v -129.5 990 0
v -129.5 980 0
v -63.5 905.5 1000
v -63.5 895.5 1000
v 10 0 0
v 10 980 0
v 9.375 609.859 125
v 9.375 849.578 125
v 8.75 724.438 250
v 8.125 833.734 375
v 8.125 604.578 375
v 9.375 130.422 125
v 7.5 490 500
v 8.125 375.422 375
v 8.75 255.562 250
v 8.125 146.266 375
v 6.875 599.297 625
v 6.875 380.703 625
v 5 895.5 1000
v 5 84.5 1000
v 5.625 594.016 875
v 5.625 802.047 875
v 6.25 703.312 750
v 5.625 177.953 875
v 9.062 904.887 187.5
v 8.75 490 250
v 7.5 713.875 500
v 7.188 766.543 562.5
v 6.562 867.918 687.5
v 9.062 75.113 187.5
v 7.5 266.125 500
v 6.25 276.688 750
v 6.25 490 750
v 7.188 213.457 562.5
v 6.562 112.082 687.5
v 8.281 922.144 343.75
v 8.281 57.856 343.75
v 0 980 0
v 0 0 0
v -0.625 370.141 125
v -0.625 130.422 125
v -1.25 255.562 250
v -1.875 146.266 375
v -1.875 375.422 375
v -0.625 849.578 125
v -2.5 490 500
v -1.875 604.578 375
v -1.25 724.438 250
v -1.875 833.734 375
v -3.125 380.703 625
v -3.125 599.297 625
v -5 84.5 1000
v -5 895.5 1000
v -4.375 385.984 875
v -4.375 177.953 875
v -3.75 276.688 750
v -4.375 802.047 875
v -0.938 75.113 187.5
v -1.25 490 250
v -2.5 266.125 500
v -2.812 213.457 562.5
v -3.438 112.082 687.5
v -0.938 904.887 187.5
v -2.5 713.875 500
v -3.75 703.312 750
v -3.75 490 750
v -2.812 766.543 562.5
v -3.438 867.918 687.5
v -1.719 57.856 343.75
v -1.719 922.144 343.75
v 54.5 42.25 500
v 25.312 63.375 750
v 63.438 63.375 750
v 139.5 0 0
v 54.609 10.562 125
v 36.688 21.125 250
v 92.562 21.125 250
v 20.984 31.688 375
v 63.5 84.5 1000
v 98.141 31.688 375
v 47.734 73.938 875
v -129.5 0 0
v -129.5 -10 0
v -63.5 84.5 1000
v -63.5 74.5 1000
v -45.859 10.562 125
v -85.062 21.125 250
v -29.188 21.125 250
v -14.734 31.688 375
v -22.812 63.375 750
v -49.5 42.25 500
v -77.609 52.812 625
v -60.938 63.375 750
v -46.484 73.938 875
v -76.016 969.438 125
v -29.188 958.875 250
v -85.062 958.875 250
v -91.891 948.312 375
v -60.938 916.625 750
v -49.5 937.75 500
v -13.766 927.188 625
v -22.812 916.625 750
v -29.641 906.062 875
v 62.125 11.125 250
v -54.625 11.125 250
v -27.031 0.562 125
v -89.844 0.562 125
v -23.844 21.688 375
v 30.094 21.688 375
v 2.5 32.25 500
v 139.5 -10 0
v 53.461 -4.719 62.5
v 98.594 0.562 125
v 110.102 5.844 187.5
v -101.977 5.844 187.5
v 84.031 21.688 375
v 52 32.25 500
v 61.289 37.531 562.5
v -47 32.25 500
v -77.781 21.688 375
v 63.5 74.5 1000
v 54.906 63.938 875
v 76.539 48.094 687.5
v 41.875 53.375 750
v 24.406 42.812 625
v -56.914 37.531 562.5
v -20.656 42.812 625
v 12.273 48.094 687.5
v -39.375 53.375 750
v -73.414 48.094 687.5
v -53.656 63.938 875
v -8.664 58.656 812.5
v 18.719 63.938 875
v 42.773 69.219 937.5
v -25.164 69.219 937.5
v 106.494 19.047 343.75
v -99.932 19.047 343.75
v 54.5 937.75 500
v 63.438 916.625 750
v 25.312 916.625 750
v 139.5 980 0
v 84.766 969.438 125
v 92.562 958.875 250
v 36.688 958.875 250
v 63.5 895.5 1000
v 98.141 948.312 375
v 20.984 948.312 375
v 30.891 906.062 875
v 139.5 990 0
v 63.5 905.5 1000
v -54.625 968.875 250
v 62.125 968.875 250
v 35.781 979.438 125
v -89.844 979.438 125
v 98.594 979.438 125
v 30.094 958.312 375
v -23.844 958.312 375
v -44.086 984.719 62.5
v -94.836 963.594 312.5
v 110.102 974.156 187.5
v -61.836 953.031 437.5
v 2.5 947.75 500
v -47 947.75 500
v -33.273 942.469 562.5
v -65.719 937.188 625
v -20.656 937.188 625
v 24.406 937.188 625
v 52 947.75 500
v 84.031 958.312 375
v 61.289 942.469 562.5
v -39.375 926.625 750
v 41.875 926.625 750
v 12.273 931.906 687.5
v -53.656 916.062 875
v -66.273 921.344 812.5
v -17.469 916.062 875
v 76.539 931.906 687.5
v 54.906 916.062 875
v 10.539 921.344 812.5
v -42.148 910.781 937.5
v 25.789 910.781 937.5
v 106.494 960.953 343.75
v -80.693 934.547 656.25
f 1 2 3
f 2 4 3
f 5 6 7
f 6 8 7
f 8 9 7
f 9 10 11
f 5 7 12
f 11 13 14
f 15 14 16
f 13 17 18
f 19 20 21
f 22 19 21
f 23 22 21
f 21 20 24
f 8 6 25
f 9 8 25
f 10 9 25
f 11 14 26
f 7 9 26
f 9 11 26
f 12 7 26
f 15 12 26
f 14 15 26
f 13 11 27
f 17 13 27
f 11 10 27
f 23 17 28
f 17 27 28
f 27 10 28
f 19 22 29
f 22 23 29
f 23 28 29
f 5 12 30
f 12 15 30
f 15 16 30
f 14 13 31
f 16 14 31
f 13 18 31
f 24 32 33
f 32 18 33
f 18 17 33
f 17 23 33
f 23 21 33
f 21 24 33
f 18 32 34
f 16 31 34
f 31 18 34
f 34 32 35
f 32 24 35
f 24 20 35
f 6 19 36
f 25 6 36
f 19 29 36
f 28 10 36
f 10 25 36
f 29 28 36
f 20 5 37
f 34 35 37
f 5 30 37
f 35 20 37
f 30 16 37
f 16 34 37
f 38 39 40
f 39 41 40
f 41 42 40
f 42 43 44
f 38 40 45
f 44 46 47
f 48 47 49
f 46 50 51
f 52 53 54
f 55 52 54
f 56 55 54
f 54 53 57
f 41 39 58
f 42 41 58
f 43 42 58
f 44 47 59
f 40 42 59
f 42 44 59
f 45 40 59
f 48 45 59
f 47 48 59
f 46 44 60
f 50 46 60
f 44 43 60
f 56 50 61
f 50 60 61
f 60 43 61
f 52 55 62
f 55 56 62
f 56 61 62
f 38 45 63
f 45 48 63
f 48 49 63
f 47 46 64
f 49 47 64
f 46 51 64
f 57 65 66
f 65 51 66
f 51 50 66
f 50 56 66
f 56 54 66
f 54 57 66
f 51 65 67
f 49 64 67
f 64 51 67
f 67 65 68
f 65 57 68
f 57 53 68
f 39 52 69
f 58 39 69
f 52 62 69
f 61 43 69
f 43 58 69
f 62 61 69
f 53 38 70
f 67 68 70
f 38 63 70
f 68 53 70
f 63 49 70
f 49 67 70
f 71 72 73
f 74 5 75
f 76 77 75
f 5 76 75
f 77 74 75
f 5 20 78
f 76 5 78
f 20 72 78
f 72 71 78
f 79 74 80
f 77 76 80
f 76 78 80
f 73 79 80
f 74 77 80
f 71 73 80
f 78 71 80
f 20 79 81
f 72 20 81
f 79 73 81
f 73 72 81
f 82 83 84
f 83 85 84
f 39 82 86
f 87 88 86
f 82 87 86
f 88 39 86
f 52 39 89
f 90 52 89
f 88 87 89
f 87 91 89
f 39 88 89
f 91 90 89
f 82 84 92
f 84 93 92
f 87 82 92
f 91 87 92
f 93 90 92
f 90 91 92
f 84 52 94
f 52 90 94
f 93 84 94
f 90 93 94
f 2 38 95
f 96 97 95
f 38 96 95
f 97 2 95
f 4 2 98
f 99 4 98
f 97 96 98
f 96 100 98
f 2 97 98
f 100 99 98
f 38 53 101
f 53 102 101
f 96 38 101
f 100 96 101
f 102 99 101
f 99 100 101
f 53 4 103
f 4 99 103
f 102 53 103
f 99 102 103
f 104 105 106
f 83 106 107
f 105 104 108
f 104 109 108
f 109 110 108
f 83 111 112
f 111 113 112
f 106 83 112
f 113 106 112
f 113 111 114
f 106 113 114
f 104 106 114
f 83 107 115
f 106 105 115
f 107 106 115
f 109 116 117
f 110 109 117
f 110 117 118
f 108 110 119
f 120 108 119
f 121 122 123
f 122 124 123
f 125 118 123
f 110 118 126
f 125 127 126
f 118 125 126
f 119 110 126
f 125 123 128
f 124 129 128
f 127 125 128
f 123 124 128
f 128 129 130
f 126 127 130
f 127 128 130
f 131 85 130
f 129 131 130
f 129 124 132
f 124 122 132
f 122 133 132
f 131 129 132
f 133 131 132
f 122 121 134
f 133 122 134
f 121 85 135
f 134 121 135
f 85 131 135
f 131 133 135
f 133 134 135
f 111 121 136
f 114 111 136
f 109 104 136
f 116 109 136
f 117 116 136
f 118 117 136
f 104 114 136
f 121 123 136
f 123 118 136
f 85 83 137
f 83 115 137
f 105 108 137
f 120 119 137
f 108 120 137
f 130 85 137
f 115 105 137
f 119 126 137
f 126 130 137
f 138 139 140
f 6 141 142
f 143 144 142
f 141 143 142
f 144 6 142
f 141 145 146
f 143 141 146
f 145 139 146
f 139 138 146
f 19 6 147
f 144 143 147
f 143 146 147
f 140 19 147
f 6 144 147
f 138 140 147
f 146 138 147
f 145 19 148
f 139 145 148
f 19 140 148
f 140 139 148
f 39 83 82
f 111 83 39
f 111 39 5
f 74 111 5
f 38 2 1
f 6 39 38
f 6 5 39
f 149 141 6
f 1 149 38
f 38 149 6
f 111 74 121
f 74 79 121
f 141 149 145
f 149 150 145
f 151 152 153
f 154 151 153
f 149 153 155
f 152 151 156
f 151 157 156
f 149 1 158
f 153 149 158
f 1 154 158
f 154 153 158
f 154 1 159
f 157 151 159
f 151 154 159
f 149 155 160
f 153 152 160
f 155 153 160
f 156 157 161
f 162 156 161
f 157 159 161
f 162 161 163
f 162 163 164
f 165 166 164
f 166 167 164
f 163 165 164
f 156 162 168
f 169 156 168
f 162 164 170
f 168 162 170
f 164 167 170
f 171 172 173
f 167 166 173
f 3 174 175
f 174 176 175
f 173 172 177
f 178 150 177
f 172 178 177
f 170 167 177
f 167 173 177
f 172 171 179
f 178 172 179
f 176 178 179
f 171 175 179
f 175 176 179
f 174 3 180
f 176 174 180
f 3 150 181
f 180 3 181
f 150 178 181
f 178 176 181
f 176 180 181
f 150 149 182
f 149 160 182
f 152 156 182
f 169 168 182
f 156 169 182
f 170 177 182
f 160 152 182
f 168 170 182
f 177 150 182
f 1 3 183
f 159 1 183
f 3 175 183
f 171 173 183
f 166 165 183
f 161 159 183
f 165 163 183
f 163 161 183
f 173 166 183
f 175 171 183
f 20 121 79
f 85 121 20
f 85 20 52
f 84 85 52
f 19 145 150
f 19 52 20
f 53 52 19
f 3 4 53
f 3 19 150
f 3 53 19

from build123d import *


with BuildPart() as part:
    # Sketch1 → Loft2 section 0
    with BuildSketch(Plane.XY):
        Polygon((-129.5, 0), (0, 0), (0, 980), (-129.5, 980), (-129.5, 990), (139.5, 990), (139.5, 980), (10, 980), (10, 0), (139.5, 0), (139.5, -10), (-129.5, -10), align=None)
    # Sketch3 → Loft2 section 1
    with BuildSketch(Plane.XY.offset(1000)):
        Polygon((-63.5, 895.5), (-5, 895.5), (-5, 84.5), (-63.5, 84.5), (-63.5, 74.5), (63.5, 74.5), (63.5, 84.5), (5, 84.5), (5, 895.5), (63.5, 895.5), (63.5, 905.5), (-63.5, 905.5), align=None)
    loft()


solid = part.part
